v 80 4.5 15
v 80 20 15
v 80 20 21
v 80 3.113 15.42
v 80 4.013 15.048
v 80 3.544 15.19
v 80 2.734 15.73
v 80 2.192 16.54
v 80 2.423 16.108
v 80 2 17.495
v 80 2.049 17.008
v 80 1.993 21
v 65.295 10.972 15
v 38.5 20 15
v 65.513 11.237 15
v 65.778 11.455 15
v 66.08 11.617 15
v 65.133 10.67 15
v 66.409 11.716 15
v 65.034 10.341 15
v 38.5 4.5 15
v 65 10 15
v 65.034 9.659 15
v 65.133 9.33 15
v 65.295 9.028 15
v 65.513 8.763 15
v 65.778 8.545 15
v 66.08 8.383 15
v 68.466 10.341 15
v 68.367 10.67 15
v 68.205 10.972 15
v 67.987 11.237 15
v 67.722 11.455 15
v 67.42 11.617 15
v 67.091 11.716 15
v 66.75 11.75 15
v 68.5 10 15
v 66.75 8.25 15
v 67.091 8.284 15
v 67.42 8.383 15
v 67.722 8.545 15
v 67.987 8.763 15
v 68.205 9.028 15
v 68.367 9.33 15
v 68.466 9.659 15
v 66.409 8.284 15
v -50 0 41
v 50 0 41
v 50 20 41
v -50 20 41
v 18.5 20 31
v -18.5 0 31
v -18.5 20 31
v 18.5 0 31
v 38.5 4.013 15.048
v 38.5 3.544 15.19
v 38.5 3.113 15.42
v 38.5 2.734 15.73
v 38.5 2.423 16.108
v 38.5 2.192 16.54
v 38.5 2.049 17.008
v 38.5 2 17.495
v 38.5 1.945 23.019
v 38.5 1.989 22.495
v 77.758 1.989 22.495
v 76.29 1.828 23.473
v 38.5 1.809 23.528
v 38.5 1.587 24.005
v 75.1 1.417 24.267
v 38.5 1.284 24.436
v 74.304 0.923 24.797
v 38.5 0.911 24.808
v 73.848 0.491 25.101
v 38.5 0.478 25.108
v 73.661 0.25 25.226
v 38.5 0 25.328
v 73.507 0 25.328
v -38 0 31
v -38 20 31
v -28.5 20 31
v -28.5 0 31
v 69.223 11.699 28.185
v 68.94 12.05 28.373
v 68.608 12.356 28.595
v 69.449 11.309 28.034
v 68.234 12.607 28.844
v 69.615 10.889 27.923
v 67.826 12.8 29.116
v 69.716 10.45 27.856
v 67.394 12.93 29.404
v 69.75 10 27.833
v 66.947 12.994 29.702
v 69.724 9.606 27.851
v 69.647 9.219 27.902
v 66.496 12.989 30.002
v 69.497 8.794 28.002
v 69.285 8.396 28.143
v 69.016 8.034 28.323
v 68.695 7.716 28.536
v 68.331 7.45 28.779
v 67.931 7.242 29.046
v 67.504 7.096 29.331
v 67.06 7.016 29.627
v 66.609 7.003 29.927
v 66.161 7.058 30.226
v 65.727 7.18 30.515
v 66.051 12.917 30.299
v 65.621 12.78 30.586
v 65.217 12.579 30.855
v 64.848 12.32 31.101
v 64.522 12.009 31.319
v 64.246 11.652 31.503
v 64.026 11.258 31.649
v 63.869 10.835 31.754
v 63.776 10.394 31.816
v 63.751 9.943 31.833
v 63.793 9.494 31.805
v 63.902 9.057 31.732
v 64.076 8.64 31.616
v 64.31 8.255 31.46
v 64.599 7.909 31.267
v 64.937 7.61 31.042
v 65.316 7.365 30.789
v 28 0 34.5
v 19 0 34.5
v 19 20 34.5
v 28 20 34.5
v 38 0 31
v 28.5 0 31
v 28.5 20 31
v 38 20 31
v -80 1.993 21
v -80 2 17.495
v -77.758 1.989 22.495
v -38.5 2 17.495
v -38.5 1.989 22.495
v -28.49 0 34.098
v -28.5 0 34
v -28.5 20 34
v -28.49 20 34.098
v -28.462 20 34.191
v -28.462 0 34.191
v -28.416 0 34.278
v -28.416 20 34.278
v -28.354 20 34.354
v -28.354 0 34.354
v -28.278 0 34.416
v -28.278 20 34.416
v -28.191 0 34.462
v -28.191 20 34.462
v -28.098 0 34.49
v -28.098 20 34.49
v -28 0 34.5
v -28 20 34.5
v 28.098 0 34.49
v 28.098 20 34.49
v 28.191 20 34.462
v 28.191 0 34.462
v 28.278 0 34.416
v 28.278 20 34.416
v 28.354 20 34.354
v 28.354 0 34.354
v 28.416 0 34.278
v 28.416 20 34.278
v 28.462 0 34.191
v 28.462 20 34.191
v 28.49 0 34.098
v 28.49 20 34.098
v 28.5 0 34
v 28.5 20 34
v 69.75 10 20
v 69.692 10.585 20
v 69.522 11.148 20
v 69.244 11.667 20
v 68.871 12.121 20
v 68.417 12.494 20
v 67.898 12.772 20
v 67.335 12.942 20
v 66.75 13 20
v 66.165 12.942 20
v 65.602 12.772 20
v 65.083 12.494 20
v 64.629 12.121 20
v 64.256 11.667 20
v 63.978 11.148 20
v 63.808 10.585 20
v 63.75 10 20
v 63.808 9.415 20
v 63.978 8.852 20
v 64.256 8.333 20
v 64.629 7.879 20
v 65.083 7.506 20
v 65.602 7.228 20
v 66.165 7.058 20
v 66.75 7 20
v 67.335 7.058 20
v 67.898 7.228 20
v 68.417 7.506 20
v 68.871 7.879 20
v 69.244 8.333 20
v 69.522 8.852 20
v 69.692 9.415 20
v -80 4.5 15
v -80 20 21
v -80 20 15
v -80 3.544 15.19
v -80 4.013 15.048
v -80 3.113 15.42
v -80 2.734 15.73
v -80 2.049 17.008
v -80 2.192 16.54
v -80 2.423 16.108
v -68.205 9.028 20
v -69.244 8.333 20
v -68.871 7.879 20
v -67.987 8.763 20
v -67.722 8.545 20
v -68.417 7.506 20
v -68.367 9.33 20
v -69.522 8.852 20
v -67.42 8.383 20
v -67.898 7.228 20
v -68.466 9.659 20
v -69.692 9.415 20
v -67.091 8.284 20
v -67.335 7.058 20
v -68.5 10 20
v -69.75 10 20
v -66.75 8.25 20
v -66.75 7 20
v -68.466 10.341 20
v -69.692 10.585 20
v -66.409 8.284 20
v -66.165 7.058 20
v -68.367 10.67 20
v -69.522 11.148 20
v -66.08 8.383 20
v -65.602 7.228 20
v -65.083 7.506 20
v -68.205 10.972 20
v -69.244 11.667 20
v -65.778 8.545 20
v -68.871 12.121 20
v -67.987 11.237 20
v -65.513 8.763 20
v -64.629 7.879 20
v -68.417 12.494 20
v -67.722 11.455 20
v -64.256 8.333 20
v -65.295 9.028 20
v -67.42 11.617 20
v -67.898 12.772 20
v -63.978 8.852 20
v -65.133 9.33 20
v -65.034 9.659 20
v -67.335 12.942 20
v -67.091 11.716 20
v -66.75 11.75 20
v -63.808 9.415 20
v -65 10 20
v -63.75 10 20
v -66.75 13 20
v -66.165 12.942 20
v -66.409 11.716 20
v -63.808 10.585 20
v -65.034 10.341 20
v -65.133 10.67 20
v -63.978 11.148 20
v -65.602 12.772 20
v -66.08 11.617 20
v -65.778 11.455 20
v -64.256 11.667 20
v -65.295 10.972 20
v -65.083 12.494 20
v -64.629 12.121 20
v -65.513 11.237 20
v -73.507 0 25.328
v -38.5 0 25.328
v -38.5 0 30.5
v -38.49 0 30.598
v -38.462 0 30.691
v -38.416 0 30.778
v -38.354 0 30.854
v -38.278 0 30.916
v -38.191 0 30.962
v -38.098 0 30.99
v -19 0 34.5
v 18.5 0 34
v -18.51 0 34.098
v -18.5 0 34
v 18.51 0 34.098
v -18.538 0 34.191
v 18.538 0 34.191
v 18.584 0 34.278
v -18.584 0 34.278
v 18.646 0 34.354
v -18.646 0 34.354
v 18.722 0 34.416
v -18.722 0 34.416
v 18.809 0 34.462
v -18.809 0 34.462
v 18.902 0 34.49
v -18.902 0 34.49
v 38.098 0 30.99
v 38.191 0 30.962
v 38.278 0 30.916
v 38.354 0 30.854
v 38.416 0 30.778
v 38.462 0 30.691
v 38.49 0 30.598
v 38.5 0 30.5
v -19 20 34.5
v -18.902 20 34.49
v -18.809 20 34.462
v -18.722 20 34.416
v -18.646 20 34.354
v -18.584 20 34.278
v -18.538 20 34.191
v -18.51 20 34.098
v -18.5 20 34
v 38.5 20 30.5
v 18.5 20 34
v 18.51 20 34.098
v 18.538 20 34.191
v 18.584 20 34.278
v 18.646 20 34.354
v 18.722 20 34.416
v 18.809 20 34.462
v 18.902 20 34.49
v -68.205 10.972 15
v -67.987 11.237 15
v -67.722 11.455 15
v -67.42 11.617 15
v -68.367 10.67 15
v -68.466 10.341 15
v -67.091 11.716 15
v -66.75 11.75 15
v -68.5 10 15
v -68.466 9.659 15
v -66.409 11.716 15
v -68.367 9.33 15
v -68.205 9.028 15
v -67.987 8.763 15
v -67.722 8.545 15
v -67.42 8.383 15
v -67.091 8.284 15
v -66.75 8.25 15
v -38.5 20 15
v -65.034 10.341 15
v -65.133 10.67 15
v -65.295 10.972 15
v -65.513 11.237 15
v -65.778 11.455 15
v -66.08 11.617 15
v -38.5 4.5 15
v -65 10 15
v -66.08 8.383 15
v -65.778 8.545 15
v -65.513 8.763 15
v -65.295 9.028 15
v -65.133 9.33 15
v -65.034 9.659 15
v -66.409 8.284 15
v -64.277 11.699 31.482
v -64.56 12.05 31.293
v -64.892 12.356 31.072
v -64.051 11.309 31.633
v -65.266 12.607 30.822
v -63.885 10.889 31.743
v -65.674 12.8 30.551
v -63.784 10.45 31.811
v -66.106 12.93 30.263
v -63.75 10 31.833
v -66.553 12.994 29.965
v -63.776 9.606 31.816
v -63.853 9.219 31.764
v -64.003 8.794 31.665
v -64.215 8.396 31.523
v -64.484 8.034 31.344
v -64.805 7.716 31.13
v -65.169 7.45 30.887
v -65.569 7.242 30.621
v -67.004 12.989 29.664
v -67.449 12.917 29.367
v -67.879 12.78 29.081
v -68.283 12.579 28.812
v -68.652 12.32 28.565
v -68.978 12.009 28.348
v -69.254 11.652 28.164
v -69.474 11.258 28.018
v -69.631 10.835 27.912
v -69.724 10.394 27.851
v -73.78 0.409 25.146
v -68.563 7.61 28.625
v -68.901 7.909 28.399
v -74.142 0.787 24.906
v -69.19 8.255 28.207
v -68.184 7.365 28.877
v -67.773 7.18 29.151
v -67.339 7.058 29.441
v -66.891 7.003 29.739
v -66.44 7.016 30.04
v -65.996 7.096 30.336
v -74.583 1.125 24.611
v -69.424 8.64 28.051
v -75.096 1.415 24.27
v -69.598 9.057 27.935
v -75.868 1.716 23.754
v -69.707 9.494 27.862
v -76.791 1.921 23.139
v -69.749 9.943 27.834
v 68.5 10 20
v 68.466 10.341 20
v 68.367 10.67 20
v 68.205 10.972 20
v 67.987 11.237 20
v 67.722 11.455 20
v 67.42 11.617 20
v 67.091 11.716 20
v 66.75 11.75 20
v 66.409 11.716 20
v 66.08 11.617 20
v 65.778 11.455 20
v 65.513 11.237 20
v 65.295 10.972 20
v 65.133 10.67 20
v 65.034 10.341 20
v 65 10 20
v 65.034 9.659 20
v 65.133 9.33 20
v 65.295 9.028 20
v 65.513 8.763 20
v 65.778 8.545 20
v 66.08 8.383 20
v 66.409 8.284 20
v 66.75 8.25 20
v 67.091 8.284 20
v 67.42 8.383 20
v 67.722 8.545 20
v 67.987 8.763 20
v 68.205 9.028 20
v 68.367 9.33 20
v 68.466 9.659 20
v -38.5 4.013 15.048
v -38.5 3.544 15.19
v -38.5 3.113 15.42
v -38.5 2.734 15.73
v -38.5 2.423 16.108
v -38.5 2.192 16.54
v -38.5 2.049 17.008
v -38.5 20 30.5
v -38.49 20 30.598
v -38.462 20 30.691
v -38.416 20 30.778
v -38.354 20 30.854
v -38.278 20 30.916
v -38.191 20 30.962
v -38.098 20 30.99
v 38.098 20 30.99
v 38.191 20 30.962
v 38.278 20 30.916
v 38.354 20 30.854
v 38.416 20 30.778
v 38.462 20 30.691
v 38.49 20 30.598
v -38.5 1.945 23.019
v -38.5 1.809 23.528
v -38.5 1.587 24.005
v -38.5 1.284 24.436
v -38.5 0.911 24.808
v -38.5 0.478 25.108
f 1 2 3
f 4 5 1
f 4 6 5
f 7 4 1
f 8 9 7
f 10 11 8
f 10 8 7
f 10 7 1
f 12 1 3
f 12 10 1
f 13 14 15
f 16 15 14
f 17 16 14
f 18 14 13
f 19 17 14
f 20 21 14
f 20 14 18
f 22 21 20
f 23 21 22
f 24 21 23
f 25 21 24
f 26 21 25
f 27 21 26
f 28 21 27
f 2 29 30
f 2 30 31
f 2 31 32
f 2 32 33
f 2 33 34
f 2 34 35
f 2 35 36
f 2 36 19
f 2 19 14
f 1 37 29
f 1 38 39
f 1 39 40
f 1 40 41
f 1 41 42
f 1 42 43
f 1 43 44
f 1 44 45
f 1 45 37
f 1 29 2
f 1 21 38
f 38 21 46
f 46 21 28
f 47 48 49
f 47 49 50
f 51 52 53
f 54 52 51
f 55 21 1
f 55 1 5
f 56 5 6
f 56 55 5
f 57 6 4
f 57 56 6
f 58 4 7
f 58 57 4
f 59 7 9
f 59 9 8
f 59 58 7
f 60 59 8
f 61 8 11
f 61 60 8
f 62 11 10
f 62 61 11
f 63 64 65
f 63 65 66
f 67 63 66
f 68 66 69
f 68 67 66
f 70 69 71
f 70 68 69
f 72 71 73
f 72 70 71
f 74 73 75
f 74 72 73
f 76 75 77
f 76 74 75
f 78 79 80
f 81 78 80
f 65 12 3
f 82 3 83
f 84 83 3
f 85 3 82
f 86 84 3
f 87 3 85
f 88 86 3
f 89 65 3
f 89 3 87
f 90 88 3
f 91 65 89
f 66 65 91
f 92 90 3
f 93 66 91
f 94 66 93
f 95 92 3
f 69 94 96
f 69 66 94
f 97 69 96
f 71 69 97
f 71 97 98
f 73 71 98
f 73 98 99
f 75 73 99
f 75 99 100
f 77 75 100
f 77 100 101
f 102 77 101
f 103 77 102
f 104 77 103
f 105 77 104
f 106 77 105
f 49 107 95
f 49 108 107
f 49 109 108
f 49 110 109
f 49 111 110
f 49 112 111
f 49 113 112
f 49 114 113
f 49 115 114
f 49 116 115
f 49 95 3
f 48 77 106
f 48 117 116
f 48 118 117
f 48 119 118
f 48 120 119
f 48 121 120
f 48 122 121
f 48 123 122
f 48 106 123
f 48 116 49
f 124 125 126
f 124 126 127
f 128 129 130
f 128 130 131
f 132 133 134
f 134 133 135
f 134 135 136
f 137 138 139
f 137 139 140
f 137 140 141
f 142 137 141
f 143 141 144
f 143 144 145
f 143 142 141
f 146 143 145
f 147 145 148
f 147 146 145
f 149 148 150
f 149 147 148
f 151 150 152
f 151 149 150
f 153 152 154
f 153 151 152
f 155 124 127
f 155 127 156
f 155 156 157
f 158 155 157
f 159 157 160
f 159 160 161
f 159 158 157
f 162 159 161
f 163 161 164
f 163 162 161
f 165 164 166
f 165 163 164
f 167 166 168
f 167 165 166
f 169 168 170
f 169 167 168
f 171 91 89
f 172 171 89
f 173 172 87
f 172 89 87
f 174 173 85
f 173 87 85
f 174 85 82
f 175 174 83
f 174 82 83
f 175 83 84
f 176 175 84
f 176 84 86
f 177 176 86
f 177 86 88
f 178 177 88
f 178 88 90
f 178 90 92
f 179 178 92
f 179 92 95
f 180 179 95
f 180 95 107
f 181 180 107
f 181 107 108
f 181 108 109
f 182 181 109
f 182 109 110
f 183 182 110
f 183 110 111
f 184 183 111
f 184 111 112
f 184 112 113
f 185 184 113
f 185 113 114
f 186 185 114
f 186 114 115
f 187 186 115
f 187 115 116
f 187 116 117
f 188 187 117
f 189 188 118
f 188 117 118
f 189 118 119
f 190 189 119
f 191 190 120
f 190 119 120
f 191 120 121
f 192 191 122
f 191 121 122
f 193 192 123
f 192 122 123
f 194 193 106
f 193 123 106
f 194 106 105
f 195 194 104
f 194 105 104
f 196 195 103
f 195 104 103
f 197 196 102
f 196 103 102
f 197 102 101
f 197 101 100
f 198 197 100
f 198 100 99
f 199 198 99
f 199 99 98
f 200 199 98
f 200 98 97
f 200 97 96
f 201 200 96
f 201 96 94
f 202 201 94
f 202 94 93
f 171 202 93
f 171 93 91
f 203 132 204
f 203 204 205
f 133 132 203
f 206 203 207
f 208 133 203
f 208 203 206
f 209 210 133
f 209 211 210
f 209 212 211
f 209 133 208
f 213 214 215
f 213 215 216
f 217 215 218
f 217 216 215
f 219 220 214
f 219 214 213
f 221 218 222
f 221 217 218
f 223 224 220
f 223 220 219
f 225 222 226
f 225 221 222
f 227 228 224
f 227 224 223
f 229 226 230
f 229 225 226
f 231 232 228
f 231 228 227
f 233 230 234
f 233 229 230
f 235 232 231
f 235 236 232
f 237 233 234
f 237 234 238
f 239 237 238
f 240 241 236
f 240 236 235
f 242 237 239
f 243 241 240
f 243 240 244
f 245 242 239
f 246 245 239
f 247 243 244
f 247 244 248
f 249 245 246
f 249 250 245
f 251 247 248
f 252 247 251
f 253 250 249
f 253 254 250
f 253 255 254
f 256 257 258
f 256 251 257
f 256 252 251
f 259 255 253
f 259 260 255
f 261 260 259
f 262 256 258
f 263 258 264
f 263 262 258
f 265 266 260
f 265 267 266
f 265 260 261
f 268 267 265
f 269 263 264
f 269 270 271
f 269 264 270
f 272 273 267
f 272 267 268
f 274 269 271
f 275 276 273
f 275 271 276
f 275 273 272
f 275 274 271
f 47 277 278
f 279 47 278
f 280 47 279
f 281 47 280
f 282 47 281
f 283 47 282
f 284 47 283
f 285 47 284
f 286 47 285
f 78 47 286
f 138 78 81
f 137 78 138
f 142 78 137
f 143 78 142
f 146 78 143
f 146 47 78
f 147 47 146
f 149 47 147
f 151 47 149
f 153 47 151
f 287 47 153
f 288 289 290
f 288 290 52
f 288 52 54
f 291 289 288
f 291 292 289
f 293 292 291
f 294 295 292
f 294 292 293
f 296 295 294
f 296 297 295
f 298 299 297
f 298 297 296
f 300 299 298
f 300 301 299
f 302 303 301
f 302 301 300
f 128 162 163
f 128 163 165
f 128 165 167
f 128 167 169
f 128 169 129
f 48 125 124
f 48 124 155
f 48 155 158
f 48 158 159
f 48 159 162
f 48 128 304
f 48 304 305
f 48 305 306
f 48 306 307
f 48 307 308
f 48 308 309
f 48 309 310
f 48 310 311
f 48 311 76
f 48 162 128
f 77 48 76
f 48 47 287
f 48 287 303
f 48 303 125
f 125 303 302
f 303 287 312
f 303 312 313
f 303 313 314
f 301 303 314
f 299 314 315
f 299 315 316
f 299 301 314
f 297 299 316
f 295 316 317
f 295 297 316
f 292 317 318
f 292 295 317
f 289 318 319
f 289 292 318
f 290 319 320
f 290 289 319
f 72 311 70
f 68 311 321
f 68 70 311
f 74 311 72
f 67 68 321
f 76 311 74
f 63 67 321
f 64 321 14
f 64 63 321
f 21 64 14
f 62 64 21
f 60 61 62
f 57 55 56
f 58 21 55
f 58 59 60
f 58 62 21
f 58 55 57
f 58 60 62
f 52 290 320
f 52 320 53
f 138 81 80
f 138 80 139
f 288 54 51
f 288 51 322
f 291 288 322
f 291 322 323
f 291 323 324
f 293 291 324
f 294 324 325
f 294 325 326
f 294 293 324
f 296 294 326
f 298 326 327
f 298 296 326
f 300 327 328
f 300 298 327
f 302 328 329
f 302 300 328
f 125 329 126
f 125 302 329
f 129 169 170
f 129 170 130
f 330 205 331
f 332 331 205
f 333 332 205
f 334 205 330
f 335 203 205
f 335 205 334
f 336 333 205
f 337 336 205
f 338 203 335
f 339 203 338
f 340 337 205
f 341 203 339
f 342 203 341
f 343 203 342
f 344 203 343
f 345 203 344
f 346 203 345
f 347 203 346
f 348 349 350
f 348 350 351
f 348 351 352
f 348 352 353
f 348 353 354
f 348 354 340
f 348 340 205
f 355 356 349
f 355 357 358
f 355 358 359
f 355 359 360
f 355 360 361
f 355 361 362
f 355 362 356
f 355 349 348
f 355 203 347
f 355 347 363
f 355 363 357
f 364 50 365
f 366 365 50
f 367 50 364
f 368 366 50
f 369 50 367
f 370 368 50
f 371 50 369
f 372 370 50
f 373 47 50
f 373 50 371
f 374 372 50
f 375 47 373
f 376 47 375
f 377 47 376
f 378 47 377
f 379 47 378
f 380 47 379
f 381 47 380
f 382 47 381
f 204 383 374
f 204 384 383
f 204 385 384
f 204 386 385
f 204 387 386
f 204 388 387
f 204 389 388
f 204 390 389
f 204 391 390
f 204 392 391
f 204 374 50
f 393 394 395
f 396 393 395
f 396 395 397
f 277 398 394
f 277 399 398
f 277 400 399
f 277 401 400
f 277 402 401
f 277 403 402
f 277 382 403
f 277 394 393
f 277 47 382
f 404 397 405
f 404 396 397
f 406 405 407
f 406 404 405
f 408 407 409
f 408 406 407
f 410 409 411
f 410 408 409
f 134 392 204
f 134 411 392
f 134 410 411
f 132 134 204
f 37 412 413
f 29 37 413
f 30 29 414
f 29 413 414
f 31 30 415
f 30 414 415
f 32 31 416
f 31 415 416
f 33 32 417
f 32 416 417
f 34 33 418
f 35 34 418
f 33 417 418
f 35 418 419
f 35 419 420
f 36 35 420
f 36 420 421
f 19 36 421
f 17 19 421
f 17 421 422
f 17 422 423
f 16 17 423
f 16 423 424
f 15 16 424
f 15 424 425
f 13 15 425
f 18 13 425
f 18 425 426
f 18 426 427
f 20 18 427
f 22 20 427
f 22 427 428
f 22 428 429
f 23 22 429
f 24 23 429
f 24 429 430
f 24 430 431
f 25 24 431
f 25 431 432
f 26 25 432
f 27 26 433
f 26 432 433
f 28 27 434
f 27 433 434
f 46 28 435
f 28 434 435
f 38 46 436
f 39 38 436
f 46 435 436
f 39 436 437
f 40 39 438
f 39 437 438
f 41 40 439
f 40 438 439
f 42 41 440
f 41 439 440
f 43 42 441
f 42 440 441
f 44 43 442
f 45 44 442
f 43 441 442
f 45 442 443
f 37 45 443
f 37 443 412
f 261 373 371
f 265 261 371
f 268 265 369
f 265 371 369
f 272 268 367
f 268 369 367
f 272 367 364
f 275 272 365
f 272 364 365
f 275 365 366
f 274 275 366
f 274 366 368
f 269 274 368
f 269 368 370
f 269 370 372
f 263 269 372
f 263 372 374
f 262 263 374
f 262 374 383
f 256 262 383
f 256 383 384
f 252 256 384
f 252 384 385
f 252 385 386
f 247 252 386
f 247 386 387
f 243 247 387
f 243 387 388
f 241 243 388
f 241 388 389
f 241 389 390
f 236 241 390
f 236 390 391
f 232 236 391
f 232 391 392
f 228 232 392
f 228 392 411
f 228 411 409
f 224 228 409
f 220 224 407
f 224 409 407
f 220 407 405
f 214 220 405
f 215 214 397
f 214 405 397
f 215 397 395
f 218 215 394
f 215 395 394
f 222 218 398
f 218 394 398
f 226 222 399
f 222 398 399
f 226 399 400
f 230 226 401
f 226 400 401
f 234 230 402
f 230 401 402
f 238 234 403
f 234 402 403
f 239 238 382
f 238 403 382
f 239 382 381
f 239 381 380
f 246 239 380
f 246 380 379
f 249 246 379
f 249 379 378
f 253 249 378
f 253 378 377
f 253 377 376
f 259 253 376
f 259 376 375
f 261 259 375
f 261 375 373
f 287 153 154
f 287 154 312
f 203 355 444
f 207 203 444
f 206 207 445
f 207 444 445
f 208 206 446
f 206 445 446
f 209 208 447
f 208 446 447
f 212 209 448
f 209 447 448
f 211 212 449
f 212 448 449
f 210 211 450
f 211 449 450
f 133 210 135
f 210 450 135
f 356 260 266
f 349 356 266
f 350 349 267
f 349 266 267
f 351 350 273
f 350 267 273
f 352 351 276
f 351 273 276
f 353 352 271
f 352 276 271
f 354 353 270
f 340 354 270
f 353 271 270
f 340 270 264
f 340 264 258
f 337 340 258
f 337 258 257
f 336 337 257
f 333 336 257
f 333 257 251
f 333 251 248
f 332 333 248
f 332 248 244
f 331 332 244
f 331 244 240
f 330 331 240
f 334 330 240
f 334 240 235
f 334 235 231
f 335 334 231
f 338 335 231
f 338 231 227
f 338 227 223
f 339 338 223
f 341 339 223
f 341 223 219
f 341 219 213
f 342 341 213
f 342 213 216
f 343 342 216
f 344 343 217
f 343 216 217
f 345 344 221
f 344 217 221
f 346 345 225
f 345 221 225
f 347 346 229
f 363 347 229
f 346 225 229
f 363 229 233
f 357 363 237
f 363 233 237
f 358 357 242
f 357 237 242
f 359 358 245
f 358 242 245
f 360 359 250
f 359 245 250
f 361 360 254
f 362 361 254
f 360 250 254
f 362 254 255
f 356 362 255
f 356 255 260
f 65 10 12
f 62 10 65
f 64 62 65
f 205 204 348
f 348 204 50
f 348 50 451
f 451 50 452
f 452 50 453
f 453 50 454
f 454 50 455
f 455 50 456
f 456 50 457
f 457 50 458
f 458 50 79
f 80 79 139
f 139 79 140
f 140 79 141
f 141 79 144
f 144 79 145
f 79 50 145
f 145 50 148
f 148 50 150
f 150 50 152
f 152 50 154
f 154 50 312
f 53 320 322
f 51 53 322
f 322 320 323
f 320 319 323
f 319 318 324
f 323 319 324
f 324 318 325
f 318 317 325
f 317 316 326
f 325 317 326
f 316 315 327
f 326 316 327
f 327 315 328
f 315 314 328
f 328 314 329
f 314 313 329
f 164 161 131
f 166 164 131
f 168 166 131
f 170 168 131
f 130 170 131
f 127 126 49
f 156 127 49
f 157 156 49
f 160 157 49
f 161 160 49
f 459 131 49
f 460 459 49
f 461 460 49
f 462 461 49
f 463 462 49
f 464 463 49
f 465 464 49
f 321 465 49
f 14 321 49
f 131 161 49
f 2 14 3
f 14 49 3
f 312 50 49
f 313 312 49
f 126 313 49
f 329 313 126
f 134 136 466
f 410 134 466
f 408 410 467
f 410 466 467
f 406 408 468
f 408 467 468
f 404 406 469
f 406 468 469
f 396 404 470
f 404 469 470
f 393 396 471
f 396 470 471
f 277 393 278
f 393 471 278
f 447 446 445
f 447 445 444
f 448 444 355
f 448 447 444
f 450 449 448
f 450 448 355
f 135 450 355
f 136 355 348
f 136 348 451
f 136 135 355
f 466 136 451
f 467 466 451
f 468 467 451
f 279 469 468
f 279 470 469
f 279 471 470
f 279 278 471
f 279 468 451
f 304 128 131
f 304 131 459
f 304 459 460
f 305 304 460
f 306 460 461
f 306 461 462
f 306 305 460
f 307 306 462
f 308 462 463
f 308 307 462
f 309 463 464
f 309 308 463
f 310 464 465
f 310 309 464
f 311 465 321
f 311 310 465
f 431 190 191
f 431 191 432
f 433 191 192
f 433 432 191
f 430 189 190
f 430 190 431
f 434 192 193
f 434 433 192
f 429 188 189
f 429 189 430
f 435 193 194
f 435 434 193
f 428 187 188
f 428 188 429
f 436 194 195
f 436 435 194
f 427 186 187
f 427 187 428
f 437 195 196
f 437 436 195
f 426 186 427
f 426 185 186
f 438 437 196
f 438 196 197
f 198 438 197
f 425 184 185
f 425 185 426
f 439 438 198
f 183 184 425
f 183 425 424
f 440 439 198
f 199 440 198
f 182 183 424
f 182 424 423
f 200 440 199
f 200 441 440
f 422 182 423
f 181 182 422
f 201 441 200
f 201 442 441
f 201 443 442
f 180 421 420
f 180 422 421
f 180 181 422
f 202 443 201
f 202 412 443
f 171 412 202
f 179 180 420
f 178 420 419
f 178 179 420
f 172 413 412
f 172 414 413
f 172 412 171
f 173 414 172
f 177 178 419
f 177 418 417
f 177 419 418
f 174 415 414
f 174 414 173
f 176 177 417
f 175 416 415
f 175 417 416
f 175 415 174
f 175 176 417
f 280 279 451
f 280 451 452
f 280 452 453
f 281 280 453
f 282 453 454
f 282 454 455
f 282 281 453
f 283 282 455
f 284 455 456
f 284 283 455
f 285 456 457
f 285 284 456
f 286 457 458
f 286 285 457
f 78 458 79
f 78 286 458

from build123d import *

# Parameters (mm, degrees)
F1_DEPTH      = 20
F3_R          = 1.75
F4_DEPTH      = 40.001
F3_R_2        = 3
F5_DEPTH      = 25
F6_W          = 160
F6_H          = 10
F7_DEPTH      = 20.001
F9_DEPTH      = 80.001
F9_DEPTH_BACK = 80.001


with BuildPart() as f1:
    # F0 (on Front) → F1 (new body)
    with BuildSketch(Plane.XZ):
        with BuildLine():
            Line((50, 41), (5, 41))
            Line((5, 41), (-5, 41))
            Line((-5, 41), (-50, 41))
            Line((-50, 41), (-80, 21))
            Line((-80, 21), (-80, 5))
            Line((-80, 5), (-38.5, 5))
            Line((-38.5, 5), (-38.5, 30.5))
            ThreePointArc((-38.5, 30.5), (-38.3535533906, 30.8535533906), (-38, 31))
            Line((-38, 31), (-28.5, 31))
            Line((-28.5, 31), (-28.5, 34))
            ThreePointArc((-28.5, 34), (-28.3535533906, 34.3535533906), (-28, 34.5))
            Line((-28, 34.5), (-19, 34.5))
            ThreePointArc((-19, 34.5), (-18.6464466094, 34.3535533906), (-18.5, 34))
            Line((-18.5, 34), (-18.5, 31))
            Line((-18.5, 31), (0, 31))
            Line((0, 31), (18.5, 31))
            Line((18.5, 31), (18.5, 34))
            ThreePointArc((18.5, 34), (18.6464466094, 34.3535533906), (19, 34.5))
            Line((19, 34.5), (28, 34.5))
            ThreePointArc((28, 34.5), (28.3535533906, 34.3535533906), (28.5, 34))
            Line((28.5, 34), (28.5, 31))
            Line((28.5, 31), (38, 31))
            ThreePointArc((38, 31), (38.3535533906, 30.8535533906), (38.5, 30.5))
            Line((38.5, 30.5), (38.5, 5))
            Line((38.5, 5), (80, 5))
            Line((80, 5), (80, 21))
            Line((80, 21), (50, 41))
        make_face()
    extrude(amount=-F1_DEPTH)

    # F3 (on offset) → F4 (cut, through all)
    with BuildSketch(Plane.XY.offset(45)):
        with Locations((-66.75, 10)):
            Circle(F3_R)
        with Locations((66.75, 10)):
            Circle(F3_R)
    extrude(amount=-F4_DEPTH, mode=Mode.SUBTRACT)

    # F3 (on offset) → F5 (cut)
    with BuildSketch(Plane.XY.offset(45)):
        with Locations((-66.75, 10)):
            Circle(F3_R_2)
        with Locations((-66.75, 10)):
            Circle(F3_R, mode=Mode.SUBTRACT)
        with Locations((66.75, 10)):
            Circle(F3_R_2)
        with Locations((66.75, 10)):
            Circle(F3_R, mode=Mode.SUBTRACT)
    extrude(amount=-F5_DEPTH, mode=Mode.SUBTRACT)

    # F6 (on Front) → F7 (cut, through all)
    with BuildSketch(Plane.XZ):
        with Locations((0, 10)):
            Rectangle(F6_W, F6_H)
    extrude(amount=-F7_DEPTH, mode=Mode.SUBTRACT)

    # F8 (on Right) → F9 (cut, two sides)
    with BuildSketch(Plane.YZ) as f9_sk:
        with BuildLine():
            ThreePointArc((4.4999439066, 15), (2.734050334, 15.7303616499), (1.999949516, 17.4947040879))
            Line((1.999949516, 17.4947040879), (1.9893576917, 22.4946928692))
            ThreePointArc((1.9893576917, 22.4946928692), (1.4447268651, 24.2275058154), (0, 25.3284271247))
            Line((0, 25.3284271247), (0, 15))
            Line((0, 15), (2.0052342213, 15))
            Line((2.0052342213, 15), (4.4999439066, 15))
        make_face()
    extrude(amount=-F9_DEPTH, mode=Mode.SUBTRACT)
    extrude(f9_sk.sketch, amount=F9_DEPTH_BACK, mode=Mode.SUBTRACT)


solid = f1.part
